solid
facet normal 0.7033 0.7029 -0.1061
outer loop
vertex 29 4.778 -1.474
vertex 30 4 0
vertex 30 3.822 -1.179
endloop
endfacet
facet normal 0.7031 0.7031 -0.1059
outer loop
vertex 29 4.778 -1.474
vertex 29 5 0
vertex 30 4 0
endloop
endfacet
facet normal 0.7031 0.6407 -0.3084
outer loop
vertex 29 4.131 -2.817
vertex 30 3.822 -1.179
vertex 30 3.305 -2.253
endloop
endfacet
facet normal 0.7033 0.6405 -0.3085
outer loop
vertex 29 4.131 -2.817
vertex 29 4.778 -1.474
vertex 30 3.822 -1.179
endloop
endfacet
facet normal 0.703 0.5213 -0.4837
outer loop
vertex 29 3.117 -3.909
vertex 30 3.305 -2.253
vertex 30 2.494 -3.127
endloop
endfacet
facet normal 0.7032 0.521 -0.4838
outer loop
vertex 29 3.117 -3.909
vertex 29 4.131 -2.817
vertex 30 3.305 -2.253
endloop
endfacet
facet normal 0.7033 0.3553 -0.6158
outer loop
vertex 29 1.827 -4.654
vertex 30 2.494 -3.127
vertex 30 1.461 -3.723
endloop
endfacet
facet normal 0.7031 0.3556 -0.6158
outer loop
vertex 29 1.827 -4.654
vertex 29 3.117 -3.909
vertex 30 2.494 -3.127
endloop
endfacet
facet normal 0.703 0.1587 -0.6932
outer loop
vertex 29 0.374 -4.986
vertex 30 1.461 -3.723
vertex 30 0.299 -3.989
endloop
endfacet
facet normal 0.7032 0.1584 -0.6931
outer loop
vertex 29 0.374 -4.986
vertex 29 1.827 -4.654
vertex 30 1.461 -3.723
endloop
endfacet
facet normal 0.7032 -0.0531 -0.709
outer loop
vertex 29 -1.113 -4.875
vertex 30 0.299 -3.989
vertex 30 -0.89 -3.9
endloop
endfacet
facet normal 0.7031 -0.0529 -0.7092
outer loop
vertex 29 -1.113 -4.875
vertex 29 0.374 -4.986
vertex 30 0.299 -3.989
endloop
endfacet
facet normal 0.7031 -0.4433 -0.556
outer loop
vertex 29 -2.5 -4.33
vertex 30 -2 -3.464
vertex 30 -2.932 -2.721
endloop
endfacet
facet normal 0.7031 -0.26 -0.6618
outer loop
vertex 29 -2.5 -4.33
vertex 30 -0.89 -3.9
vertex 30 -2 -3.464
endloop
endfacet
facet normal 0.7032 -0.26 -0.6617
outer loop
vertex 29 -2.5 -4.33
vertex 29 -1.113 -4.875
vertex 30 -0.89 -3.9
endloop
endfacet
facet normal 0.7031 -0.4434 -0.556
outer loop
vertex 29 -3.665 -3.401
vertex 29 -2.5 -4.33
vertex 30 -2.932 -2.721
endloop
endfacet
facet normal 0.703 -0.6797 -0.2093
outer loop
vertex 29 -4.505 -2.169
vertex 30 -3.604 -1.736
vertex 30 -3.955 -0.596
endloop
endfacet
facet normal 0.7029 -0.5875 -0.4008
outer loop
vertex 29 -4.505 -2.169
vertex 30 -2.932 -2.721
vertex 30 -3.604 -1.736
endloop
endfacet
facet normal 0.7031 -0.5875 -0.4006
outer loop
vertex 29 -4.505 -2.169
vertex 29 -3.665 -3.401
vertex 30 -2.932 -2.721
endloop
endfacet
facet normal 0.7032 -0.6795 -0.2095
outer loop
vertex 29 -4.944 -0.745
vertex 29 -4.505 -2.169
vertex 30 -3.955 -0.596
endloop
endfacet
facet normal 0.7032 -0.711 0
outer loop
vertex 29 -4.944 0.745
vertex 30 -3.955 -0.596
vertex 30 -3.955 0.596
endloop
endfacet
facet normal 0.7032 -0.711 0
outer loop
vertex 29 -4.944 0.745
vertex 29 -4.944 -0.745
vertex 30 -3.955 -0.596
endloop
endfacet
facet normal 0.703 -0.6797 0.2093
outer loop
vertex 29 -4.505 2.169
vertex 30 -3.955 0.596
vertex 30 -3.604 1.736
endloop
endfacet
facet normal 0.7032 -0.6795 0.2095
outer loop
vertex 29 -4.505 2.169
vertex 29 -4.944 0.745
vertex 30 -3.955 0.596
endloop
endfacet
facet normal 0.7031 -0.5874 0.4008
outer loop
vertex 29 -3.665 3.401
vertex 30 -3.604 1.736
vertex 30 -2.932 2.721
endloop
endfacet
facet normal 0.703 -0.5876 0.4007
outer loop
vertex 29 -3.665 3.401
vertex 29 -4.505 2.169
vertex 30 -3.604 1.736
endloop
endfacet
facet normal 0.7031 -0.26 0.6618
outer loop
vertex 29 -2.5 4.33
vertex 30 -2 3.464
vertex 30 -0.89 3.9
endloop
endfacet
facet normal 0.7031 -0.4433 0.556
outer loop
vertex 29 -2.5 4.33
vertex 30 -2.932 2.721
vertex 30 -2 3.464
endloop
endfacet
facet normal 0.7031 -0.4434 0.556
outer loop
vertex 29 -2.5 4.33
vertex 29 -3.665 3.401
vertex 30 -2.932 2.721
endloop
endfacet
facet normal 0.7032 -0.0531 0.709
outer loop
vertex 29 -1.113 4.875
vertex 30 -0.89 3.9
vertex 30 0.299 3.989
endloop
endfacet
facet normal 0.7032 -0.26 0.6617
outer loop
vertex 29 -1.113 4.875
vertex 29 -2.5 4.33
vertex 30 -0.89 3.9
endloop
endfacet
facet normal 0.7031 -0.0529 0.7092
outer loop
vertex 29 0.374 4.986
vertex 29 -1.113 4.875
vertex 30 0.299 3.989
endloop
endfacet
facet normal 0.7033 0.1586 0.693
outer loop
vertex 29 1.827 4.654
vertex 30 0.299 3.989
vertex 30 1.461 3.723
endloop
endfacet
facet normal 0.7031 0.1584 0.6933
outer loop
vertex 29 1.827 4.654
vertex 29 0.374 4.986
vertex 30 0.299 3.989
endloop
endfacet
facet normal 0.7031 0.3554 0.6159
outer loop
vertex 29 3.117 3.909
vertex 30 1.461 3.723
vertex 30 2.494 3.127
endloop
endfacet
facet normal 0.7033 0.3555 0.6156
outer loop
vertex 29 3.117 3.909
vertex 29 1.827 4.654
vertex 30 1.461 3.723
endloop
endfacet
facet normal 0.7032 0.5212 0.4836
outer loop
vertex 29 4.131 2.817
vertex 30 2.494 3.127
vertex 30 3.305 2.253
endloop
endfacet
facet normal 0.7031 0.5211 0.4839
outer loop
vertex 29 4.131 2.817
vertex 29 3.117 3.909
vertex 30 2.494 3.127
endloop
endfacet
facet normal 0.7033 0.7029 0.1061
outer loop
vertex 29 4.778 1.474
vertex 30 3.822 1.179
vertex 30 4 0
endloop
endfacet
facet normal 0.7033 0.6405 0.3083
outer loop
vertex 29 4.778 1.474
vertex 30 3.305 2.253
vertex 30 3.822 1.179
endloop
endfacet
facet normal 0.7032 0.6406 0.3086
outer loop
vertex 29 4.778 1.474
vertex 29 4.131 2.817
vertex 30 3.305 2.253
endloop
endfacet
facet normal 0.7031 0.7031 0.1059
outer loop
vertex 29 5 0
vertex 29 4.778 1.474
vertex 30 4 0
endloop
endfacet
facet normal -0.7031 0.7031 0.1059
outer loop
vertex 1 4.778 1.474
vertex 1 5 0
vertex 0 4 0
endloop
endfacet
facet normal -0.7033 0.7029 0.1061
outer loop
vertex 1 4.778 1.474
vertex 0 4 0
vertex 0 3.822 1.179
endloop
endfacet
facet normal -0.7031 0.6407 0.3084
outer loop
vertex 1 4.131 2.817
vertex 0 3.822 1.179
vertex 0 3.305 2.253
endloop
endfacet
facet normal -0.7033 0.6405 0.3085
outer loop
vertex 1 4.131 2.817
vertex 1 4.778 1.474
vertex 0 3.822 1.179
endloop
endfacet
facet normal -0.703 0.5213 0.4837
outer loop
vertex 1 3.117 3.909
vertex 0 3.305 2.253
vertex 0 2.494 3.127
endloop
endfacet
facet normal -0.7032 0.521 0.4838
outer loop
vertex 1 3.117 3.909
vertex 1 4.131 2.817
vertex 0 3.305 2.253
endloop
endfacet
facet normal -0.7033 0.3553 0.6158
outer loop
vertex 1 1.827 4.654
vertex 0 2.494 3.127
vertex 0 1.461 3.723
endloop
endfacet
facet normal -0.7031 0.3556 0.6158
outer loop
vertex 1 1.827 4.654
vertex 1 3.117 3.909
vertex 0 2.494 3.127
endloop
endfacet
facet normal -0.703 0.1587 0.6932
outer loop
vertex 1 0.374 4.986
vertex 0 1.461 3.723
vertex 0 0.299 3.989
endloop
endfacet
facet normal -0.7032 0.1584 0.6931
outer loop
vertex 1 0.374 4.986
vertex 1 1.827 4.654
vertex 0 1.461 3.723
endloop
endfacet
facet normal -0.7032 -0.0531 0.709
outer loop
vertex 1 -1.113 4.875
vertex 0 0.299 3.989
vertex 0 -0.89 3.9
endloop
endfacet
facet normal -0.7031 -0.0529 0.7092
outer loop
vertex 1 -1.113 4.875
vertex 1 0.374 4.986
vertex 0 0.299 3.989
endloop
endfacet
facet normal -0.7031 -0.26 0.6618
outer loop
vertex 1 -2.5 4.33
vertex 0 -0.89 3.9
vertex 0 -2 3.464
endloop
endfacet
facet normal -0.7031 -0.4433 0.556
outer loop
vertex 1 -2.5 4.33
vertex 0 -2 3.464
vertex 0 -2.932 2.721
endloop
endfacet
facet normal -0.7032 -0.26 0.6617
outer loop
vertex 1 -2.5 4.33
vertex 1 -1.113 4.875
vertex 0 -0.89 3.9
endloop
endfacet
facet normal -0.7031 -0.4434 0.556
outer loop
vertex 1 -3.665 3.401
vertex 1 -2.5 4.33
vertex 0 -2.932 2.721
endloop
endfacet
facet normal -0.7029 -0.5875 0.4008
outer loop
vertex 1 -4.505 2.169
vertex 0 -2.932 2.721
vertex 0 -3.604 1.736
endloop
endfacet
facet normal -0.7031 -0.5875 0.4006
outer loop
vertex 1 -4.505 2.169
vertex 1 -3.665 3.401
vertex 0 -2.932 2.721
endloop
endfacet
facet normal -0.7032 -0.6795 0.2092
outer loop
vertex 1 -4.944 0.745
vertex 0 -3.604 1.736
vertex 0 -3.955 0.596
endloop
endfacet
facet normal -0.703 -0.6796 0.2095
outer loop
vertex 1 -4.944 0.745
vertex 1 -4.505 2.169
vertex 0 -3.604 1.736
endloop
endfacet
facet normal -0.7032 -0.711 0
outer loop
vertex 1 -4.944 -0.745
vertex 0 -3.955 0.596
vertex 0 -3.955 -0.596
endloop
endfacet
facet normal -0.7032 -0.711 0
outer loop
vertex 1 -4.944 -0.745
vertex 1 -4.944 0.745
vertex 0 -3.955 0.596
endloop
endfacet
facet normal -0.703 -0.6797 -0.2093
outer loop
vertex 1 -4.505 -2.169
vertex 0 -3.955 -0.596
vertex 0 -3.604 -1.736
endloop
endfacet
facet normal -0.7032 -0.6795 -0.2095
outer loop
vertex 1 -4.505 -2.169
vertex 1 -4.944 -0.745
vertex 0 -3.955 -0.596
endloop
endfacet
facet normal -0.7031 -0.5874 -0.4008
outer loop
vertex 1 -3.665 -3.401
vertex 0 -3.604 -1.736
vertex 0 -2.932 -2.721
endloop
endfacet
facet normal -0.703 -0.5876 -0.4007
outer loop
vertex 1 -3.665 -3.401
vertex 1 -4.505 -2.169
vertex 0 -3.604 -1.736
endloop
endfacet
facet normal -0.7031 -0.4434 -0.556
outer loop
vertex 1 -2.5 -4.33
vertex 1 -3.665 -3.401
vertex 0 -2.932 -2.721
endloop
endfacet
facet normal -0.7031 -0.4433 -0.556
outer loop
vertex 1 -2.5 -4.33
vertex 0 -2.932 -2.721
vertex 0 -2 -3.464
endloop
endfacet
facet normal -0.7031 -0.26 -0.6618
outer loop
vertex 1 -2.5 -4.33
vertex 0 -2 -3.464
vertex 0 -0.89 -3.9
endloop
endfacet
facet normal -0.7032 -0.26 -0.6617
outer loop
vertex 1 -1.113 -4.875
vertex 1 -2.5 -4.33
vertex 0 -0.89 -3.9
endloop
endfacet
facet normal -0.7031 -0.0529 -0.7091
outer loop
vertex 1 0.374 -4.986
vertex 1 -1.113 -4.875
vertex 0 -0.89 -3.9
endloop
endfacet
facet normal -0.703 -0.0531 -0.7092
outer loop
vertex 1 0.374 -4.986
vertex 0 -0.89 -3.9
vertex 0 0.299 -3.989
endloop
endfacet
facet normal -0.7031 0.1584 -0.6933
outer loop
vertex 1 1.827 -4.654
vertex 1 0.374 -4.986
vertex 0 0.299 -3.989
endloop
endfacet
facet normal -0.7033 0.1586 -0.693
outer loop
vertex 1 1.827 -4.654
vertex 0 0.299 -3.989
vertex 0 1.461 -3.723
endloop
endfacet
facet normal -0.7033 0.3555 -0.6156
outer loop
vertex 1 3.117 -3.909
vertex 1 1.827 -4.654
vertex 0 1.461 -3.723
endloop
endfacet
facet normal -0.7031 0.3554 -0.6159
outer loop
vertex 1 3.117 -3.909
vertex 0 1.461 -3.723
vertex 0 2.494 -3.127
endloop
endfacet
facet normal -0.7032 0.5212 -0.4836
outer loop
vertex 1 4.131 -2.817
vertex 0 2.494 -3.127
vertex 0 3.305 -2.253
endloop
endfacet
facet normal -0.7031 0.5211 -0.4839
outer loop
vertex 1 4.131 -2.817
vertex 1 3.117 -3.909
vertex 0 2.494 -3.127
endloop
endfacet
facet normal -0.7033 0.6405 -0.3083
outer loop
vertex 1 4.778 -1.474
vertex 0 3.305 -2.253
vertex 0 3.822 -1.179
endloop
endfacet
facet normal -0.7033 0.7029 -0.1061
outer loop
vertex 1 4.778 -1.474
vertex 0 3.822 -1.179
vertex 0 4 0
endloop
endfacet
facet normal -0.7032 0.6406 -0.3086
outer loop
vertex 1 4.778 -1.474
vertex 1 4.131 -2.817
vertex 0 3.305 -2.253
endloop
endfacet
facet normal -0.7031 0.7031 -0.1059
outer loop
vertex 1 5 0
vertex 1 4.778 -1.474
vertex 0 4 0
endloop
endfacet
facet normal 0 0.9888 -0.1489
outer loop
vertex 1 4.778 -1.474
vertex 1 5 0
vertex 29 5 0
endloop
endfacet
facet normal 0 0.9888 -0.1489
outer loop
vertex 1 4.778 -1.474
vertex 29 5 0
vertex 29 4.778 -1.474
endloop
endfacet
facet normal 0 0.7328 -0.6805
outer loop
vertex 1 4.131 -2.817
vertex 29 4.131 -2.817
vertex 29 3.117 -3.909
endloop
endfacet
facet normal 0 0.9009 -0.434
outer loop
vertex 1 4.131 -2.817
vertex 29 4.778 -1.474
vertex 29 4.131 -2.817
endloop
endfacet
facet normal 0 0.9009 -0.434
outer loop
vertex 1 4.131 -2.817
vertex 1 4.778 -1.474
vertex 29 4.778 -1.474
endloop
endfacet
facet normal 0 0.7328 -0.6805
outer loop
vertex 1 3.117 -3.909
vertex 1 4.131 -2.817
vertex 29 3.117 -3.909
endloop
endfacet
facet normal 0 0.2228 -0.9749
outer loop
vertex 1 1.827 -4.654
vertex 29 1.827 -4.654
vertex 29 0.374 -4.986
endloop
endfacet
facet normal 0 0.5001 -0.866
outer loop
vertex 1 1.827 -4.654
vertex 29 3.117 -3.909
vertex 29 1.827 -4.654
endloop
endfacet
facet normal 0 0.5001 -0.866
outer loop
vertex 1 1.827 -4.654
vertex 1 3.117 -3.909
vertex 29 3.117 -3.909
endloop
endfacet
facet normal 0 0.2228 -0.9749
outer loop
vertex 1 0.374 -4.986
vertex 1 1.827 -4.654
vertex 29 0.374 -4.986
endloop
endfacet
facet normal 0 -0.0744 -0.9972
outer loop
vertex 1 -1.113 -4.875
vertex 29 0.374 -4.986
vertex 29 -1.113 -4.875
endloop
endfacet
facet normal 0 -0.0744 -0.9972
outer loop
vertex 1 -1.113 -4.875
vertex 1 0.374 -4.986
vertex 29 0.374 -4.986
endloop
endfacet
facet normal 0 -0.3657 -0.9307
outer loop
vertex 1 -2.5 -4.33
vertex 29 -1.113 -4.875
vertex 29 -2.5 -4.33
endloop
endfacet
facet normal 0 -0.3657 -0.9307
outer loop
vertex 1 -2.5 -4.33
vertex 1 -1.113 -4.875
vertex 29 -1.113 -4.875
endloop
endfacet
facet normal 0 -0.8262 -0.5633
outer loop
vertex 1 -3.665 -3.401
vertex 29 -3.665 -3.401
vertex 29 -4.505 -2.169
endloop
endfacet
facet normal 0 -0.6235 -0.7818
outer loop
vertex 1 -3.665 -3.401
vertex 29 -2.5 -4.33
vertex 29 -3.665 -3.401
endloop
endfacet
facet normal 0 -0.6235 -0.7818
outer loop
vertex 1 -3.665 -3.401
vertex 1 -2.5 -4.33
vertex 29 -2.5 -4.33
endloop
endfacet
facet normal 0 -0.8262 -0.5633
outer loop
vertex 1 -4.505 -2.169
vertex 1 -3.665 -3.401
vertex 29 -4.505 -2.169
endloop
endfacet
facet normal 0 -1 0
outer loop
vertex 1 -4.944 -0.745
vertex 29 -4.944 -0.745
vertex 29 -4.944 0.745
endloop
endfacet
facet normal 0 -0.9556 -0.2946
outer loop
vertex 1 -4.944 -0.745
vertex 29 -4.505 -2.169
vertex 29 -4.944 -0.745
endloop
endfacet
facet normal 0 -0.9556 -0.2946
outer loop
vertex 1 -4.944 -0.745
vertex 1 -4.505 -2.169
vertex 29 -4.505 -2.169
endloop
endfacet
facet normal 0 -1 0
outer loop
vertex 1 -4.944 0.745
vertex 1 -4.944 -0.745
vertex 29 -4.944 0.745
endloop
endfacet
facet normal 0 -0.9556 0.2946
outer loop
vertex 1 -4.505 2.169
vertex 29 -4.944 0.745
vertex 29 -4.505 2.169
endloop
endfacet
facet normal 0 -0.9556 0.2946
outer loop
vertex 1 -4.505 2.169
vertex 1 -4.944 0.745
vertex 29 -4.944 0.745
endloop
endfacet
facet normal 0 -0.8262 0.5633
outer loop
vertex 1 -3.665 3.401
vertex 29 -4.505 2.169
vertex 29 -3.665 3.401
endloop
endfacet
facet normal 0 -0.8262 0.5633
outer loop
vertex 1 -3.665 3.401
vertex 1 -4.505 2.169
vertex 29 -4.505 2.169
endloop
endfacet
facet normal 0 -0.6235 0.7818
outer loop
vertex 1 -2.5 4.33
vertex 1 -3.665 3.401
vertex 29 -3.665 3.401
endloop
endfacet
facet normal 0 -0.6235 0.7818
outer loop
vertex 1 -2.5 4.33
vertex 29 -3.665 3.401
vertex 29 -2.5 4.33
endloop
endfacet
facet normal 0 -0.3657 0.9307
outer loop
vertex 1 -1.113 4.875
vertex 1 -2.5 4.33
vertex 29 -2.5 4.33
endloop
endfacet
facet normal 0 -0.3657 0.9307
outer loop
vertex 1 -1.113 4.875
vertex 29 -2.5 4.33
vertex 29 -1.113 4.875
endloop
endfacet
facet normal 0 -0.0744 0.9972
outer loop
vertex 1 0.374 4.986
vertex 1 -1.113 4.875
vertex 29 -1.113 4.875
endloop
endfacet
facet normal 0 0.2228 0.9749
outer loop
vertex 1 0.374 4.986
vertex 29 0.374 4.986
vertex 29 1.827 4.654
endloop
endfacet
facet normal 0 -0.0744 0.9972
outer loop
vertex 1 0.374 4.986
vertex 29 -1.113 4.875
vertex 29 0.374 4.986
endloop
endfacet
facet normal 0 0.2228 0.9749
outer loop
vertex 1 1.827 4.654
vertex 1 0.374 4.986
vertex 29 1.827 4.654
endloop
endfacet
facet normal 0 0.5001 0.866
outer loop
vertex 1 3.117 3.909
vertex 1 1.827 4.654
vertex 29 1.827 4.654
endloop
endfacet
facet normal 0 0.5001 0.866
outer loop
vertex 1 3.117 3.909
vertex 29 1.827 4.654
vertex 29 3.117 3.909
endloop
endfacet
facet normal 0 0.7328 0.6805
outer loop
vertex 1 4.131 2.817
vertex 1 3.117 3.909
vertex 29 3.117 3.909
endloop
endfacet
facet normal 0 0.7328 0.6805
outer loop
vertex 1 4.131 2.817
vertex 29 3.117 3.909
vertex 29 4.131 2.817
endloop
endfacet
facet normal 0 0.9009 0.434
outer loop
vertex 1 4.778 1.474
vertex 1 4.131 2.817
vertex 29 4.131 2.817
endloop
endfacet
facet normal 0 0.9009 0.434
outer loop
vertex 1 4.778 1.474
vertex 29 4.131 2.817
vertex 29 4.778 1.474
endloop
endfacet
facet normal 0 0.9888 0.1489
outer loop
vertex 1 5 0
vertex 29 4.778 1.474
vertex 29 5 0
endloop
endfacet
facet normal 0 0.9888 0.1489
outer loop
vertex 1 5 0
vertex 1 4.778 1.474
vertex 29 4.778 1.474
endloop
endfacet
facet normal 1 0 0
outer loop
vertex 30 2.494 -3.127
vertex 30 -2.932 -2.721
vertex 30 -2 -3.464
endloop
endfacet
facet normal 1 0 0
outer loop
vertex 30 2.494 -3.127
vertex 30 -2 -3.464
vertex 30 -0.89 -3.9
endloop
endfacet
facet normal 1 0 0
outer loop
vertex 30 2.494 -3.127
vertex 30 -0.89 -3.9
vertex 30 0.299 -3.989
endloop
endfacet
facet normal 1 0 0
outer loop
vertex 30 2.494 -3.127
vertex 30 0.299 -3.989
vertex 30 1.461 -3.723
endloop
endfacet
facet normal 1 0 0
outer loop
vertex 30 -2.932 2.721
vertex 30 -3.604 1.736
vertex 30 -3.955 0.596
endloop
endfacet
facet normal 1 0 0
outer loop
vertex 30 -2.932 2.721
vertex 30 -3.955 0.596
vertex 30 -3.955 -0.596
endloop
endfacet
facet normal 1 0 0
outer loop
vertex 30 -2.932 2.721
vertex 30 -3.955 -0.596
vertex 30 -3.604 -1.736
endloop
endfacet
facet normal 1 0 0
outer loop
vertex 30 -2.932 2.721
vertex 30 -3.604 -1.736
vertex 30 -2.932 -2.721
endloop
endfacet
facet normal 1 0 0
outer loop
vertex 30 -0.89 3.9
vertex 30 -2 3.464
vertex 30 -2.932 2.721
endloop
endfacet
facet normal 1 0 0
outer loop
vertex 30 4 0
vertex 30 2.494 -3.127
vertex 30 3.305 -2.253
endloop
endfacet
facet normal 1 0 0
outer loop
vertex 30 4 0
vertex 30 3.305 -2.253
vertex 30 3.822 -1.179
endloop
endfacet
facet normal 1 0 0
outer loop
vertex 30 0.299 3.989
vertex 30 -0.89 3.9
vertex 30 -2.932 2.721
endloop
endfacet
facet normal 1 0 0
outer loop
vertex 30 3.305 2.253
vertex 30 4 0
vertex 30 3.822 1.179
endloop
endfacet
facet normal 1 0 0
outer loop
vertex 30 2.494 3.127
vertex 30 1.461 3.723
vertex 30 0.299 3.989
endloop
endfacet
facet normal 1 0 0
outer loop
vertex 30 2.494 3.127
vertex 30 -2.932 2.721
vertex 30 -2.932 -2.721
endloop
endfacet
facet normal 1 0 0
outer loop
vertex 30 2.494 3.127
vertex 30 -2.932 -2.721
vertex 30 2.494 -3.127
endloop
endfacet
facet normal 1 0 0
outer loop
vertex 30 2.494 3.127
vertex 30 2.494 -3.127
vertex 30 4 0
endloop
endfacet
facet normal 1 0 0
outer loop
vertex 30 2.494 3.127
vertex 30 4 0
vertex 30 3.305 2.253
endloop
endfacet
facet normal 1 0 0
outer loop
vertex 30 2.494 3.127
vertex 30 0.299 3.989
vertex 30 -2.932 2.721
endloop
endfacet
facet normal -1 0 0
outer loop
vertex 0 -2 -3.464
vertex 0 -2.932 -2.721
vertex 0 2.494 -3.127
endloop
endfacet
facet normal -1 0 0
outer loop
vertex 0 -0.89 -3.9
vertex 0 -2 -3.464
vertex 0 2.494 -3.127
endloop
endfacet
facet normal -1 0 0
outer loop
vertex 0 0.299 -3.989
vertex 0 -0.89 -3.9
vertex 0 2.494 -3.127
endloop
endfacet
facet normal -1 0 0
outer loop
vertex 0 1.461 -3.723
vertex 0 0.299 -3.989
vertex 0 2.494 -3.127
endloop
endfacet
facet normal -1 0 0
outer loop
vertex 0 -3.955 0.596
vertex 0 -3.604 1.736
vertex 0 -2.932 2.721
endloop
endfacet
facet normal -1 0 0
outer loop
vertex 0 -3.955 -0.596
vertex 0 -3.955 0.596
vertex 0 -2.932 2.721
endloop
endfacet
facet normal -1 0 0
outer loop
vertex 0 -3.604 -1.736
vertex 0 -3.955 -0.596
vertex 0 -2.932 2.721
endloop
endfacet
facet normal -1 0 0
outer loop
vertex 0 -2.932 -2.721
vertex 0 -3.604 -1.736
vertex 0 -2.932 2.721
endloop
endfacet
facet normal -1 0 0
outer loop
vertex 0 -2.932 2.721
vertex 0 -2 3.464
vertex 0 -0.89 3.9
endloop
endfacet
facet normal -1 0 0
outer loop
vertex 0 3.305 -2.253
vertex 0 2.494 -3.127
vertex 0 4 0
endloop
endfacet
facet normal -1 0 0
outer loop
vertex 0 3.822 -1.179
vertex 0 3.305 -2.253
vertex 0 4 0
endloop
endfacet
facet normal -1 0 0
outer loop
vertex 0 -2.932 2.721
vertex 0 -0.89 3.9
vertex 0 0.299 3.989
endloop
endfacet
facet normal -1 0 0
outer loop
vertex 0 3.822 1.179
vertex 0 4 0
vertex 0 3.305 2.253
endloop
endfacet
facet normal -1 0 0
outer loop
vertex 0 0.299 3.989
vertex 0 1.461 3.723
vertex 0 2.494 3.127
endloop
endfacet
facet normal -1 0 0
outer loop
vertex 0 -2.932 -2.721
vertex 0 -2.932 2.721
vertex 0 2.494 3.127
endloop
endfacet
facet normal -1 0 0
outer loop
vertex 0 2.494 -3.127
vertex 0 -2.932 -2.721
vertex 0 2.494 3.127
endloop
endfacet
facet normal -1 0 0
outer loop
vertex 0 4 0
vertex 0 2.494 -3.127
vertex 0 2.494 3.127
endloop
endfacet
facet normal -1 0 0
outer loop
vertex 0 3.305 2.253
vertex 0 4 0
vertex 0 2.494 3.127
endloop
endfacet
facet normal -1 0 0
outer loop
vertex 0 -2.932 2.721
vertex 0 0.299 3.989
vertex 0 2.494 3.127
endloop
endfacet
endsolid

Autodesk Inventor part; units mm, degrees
ref_plane "YZ Plane" through (0, 0, 0) normal (1, 0, 0) x (0, 1, 0)
ref_plane "XZ Plane" through (0, 0, 0) normal (0, 1, 0) x (-1, 0, 0)
ref_plane "XY Plane" through (0, 0, 0) normal (0, 0, 1) x (1, 0, 0)
sketch "Skizze" plane through (0, 0, 0) normal (1, 0, 0) x (0, 1, 0)
  circle A0 centre (0, 0) radius 5
  dimension "d1" = 10
extrude "Körper" add sketch "Skizze" along normal blind 30
chamfer "Fase1" distance 1 angle 45 1 edges at (0, -5, 0) measured on face at (20, 4.9838, -0.4023)
chamfer "Skizze2" distance 1 angle 45 1 edges at (30, -5, 0) measured on face at (20.3333, 4.9838, -0.4023)
equation "\"d1\" = NND"
equation "\"d2\" = NLG"
equation "\"d4\" = PHH"
equation "\"d5\" = FAWI"
equation "\"d11\" = PHH"
equation "\"d8\" = PHH"
equation "\"d9\" = FAWI"
equation "\"d12\" = PHH"
equation "\"NND\" = 10"
equation "\"NLG\" = 30"
equation "\"PHH\" = 1"
equation "\"FAWI\" = 45deg"
equation "\"KAH\" = 0.8"
equation "\"NLG1\" = 32"
properties part number "CNS 397 - 10 x 30" material "Stahl, weich"
